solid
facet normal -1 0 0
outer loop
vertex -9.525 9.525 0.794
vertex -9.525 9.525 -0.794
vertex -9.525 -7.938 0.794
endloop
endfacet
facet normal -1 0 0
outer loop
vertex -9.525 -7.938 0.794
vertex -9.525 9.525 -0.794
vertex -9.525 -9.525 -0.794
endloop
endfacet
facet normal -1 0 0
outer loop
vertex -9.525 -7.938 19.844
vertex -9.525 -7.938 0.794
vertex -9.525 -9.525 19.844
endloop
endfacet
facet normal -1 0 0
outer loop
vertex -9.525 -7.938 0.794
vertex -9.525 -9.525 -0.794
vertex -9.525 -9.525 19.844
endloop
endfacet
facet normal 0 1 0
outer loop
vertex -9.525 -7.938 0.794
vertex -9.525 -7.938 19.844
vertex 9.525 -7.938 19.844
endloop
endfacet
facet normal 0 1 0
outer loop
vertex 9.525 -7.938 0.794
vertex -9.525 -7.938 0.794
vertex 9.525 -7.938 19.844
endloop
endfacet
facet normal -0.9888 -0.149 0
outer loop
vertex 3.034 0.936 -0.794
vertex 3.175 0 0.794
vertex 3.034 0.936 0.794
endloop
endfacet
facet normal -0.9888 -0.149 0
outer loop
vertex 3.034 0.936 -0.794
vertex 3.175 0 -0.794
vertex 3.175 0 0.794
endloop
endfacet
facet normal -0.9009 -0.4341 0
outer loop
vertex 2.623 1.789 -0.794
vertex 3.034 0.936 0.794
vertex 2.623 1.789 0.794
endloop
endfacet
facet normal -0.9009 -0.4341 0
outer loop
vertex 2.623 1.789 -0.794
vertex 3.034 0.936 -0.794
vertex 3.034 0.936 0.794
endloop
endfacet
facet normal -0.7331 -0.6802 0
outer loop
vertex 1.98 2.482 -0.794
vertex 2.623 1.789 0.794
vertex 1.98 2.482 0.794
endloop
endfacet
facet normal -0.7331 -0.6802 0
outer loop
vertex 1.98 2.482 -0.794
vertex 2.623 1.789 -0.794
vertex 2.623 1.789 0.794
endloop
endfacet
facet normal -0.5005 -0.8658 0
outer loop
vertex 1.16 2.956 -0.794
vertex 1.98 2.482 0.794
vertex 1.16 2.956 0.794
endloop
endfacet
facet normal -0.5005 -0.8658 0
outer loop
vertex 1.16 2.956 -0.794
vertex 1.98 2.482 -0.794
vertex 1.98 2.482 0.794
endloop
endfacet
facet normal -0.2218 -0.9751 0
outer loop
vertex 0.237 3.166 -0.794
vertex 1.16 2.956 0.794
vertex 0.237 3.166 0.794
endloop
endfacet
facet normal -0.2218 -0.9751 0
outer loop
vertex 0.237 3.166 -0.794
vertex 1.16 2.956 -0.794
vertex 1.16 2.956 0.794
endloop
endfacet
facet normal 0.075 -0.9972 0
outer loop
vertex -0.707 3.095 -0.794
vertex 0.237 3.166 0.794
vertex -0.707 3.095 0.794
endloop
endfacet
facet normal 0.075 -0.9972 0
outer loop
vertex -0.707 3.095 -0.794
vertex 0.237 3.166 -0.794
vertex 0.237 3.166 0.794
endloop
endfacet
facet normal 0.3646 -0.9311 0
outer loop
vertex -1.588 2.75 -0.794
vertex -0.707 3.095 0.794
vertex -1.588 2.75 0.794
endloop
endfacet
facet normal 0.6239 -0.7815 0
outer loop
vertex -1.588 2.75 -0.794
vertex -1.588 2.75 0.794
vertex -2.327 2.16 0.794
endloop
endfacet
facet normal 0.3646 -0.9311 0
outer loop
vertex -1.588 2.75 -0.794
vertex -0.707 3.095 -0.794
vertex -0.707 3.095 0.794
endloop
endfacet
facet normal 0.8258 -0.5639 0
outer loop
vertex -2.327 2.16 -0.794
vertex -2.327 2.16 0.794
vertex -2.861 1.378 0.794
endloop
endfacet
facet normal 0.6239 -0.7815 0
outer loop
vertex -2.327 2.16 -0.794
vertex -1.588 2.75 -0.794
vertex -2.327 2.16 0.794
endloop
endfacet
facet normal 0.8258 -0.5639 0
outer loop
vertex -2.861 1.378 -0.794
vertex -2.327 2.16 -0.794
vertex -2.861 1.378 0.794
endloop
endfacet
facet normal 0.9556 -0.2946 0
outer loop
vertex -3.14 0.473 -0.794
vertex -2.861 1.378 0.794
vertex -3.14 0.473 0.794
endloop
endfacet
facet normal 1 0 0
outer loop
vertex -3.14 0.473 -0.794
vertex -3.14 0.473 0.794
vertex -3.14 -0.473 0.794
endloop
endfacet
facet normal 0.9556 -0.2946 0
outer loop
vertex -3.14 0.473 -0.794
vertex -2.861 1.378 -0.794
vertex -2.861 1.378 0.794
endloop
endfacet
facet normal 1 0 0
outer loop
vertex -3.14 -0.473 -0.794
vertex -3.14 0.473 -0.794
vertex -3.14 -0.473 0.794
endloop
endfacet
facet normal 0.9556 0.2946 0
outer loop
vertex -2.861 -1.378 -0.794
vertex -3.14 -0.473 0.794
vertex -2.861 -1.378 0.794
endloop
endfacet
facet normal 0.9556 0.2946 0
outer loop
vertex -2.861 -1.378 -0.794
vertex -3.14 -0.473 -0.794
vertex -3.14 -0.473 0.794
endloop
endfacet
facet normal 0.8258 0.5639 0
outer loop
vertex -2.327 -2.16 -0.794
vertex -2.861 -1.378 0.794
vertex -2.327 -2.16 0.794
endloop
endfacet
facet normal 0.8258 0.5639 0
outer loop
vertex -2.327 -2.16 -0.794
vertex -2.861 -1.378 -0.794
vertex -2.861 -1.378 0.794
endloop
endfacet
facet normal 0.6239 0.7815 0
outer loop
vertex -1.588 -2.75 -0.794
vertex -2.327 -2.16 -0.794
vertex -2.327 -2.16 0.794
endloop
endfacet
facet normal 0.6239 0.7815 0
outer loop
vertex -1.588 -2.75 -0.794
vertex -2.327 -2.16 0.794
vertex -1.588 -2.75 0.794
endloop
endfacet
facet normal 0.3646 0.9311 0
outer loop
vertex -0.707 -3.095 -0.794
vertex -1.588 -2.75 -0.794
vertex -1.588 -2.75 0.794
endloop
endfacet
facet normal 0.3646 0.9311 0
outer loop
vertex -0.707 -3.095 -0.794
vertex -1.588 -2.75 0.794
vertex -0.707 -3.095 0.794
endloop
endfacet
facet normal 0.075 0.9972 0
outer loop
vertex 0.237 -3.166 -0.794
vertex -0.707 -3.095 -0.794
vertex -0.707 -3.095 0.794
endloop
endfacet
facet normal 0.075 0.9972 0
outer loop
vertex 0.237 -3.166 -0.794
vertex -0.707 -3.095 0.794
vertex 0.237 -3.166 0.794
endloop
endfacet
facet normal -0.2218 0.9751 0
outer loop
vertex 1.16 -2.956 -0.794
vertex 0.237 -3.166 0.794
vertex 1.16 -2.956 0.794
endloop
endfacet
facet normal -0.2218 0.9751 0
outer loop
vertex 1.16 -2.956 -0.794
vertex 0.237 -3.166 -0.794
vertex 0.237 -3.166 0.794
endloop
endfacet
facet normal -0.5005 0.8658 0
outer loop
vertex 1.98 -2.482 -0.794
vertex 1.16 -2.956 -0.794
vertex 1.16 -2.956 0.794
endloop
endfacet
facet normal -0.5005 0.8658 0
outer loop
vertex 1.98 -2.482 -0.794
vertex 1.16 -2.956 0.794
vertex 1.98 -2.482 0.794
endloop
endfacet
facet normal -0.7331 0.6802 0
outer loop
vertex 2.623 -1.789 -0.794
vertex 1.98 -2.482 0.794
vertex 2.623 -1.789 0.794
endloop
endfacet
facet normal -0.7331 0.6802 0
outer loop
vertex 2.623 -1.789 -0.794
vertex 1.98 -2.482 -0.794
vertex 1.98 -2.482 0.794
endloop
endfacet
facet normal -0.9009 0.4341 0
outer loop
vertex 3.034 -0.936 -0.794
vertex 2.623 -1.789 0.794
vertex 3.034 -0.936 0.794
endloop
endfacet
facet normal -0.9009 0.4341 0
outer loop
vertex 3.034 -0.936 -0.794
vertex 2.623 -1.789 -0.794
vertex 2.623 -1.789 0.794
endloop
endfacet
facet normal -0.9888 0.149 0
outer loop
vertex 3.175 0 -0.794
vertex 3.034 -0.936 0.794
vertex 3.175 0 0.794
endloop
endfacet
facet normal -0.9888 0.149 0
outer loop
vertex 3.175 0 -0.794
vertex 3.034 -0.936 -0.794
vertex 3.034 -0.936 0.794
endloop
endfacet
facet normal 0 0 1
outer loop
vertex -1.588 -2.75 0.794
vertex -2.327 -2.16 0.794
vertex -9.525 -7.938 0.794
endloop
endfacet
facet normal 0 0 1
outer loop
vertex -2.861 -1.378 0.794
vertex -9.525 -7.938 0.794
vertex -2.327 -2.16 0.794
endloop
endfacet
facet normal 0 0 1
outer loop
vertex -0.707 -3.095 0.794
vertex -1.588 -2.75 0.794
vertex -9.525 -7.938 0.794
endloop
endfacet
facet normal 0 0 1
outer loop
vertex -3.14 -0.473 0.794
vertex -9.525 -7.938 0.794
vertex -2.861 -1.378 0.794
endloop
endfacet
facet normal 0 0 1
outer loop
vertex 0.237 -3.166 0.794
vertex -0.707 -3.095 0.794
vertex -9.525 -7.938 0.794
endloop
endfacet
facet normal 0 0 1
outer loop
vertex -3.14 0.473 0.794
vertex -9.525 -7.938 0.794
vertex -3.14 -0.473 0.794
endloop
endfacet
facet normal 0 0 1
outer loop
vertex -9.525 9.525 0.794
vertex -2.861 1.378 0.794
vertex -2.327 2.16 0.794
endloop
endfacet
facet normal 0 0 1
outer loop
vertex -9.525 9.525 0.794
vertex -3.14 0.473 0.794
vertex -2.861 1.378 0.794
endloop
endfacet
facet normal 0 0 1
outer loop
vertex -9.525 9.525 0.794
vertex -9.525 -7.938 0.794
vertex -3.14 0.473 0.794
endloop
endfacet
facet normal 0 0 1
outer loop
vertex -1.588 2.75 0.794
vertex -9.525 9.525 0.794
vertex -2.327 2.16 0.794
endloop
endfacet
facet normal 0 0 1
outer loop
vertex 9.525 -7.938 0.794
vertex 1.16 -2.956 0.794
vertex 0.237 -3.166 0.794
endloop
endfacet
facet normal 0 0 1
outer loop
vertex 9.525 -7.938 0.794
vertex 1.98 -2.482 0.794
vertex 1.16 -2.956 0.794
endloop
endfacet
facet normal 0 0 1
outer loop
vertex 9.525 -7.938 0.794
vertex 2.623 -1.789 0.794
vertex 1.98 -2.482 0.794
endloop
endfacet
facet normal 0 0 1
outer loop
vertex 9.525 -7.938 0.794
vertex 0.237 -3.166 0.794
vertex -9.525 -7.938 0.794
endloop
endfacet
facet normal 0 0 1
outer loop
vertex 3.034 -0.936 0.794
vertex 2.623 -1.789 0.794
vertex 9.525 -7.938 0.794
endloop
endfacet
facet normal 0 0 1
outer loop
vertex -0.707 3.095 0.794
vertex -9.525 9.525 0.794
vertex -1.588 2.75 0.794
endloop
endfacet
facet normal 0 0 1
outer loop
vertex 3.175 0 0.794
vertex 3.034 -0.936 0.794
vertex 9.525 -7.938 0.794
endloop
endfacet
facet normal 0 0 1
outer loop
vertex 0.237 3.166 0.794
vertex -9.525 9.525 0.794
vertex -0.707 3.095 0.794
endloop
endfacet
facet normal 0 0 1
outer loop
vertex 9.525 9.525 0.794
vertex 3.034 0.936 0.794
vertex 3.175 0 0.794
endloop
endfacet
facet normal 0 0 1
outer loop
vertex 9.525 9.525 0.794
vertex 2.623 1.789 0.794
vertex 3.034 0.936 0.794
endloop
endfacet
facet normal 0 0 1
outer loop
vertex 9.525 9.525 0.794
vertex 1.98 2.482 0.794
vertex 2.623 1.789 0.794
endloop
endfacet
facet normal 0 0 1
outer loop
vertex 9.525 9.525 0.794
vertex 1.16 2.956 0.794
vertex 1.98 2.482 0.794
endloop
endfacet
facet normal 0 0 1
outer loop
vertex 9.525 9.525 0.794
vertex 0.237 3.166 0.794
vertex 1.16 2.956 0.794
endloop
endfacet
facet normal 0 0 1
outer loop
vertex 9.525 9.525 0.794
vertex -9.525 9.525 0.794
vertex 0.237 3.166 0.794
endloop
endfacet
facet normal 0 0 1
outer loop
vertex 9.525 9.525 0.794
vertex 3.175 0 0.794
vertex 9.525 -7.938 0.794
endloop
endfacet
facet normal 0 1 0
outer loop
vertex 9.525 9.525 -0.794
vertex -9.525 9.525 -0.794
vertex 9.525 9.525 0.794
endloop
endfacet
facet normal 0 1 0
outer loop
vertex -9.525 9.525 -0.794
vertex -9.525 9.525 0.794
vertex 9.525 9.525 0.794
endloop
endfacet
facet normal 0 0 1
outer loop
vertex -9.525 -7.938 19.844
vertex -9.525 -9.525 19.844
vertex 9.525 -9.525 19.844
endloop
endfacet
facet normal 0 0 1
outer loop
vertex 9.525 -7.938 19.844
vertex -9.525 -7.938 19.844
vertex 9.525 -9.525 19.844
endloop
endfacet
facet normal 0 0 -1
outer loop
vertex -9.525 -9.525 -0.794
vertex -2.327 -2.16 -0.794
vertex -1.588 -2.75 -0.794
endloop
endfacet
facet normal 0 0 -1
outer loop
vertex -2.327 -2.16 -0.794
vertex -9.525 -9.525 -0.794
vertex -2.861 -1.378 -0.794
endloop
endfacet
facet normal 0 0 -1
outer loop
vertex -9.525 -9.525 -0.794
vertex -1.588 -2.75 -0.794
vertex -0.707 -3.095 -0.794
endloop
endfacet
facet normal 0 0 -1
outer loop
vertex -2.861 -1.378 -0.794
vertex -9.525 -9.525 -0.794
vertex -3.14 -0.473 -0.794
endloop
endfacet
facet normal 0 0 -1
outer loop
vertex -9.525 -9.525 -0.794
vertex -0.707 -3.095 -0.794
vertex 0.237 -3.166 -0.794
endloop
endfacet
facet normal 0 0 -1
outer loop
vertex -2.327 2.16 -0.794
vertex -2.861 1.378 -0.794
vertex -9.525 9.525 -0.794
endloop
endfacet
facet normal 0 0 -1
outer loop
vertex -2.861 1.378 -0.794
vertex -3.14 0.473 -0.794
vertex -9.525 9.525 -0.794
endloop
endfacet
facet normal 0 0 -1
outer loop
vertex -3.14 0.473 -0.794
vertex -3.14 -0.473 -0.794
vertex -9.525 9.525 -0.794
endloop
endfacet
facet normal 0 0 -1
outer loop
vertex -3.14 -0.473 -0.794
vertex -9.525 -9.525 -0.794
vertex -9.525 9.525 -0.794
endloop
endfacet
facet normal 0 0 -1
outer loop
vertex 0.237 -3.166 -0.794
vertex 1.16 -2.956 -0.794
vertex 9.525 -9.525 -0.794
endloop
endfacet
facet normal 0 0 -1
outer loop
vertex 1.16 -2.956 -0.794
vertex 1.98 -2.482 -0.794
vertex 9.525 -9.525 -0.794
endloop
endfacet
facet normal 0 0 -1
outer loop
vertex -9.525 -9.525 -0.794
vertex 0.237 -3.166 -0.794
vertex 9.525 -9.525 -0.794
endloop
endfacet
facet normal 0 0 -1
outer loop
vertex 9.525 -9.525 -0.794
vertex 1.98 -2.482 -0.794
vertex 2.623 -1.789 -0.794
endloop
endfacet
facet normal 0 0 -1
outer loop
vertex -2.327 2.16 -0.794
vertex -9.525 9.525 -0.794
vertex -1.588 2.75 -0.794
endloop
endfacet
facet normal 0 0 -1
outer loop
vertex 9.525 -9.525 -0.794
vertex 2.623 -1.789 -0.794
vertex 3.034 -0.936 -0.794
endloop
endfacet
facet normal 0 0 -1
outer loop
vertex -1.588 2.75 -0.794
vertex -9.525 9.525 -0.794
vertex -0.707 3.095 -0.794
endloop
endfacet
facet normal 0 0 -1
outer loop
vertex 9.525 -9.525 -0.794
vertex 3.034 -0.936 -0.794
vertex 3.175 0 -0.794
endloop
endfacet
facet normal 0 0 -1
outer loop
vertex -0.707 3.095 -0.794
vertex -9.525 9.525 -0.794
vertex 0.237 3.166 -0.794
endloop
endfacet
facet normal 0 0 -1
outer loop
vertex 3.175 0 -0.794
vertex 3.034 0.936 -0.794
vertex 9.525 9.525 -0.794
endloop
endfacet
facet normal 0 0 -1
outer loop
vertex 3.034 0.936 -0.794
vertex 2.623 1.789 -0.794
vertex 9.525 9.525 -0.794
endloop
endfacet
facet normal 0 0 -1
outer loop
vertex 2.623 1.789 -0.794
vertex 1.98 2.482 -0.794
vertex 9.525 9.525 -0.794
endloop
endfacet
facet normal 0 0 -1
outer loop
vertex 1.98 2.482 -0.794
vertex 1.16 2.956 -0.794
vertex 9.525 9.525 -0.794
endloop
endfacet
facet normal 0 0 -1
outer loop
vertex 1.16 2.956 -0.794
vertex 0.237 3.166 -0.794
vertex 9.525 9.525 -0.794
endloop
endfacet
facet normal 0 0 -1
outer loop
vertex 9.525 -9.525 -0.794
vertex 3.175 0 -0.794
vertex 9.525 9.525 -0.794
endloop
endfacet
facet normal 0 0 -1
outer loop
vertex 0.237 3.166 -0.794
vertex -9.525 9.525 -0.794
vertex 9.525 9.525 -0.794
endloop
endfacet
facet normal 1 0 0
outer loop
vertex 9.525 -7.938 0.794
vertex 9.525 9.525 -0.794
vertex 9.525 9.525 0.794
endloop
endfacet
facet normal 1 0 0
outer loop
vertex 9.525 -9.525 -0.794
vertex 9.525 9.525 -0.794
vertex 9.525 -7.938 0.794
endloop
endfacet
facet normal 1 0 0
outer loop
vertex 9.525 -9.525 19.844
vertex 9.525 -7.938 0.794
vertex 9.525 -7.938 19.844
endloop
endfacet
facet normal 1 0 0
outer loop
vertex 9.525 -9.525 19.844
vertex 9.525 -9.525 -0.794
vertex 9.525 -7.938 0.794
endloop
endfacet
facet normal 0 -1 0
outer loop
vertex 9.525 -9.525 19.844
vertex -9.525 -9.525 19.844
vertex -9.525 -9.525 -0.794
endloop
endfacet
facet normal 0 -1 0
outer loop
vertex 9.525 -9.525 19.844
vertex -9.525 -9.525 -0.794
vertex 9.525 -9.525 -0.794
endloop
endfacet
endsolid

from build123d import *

# Parameters (mm, degrees)
SKETCH1_W           = 19.05
SKETCH1_H           = 19.05
SKETCH1_R           = 3.175
BOSS_EXTRUDE1_DEPTH = 0.79375
SKETCH2_W           = 19.05
SKETCH2_H           = 19.05
BOSS_EXTRUDE2_DEPTH = 1.5875


with BuildPart() as part:
    # Sketch1 → Boss-Extrude1 (new body, symmetric)
    with BuildSketch(Plane.XY):
        Rectangle(SKETCH1_W, SKETCH1_H)
        Circle(SKETCH1_R, mode=Mode.SUBTRACT)
    extrude(amount=BOSS_EXTRUDE1_DEPTH, both=True)

    # Sketch2 → Boss-Extrude2 (add)
    with BuildSketch(Plane.XZ.offset(9.525)):
        with Locations((0, 10.31875)):
            Rectangle(SKETCH2_W, SKETCH2_H)
    extrude(amount=-BOSS_EXTRUDE2_DEPTH)


solid = part.part
